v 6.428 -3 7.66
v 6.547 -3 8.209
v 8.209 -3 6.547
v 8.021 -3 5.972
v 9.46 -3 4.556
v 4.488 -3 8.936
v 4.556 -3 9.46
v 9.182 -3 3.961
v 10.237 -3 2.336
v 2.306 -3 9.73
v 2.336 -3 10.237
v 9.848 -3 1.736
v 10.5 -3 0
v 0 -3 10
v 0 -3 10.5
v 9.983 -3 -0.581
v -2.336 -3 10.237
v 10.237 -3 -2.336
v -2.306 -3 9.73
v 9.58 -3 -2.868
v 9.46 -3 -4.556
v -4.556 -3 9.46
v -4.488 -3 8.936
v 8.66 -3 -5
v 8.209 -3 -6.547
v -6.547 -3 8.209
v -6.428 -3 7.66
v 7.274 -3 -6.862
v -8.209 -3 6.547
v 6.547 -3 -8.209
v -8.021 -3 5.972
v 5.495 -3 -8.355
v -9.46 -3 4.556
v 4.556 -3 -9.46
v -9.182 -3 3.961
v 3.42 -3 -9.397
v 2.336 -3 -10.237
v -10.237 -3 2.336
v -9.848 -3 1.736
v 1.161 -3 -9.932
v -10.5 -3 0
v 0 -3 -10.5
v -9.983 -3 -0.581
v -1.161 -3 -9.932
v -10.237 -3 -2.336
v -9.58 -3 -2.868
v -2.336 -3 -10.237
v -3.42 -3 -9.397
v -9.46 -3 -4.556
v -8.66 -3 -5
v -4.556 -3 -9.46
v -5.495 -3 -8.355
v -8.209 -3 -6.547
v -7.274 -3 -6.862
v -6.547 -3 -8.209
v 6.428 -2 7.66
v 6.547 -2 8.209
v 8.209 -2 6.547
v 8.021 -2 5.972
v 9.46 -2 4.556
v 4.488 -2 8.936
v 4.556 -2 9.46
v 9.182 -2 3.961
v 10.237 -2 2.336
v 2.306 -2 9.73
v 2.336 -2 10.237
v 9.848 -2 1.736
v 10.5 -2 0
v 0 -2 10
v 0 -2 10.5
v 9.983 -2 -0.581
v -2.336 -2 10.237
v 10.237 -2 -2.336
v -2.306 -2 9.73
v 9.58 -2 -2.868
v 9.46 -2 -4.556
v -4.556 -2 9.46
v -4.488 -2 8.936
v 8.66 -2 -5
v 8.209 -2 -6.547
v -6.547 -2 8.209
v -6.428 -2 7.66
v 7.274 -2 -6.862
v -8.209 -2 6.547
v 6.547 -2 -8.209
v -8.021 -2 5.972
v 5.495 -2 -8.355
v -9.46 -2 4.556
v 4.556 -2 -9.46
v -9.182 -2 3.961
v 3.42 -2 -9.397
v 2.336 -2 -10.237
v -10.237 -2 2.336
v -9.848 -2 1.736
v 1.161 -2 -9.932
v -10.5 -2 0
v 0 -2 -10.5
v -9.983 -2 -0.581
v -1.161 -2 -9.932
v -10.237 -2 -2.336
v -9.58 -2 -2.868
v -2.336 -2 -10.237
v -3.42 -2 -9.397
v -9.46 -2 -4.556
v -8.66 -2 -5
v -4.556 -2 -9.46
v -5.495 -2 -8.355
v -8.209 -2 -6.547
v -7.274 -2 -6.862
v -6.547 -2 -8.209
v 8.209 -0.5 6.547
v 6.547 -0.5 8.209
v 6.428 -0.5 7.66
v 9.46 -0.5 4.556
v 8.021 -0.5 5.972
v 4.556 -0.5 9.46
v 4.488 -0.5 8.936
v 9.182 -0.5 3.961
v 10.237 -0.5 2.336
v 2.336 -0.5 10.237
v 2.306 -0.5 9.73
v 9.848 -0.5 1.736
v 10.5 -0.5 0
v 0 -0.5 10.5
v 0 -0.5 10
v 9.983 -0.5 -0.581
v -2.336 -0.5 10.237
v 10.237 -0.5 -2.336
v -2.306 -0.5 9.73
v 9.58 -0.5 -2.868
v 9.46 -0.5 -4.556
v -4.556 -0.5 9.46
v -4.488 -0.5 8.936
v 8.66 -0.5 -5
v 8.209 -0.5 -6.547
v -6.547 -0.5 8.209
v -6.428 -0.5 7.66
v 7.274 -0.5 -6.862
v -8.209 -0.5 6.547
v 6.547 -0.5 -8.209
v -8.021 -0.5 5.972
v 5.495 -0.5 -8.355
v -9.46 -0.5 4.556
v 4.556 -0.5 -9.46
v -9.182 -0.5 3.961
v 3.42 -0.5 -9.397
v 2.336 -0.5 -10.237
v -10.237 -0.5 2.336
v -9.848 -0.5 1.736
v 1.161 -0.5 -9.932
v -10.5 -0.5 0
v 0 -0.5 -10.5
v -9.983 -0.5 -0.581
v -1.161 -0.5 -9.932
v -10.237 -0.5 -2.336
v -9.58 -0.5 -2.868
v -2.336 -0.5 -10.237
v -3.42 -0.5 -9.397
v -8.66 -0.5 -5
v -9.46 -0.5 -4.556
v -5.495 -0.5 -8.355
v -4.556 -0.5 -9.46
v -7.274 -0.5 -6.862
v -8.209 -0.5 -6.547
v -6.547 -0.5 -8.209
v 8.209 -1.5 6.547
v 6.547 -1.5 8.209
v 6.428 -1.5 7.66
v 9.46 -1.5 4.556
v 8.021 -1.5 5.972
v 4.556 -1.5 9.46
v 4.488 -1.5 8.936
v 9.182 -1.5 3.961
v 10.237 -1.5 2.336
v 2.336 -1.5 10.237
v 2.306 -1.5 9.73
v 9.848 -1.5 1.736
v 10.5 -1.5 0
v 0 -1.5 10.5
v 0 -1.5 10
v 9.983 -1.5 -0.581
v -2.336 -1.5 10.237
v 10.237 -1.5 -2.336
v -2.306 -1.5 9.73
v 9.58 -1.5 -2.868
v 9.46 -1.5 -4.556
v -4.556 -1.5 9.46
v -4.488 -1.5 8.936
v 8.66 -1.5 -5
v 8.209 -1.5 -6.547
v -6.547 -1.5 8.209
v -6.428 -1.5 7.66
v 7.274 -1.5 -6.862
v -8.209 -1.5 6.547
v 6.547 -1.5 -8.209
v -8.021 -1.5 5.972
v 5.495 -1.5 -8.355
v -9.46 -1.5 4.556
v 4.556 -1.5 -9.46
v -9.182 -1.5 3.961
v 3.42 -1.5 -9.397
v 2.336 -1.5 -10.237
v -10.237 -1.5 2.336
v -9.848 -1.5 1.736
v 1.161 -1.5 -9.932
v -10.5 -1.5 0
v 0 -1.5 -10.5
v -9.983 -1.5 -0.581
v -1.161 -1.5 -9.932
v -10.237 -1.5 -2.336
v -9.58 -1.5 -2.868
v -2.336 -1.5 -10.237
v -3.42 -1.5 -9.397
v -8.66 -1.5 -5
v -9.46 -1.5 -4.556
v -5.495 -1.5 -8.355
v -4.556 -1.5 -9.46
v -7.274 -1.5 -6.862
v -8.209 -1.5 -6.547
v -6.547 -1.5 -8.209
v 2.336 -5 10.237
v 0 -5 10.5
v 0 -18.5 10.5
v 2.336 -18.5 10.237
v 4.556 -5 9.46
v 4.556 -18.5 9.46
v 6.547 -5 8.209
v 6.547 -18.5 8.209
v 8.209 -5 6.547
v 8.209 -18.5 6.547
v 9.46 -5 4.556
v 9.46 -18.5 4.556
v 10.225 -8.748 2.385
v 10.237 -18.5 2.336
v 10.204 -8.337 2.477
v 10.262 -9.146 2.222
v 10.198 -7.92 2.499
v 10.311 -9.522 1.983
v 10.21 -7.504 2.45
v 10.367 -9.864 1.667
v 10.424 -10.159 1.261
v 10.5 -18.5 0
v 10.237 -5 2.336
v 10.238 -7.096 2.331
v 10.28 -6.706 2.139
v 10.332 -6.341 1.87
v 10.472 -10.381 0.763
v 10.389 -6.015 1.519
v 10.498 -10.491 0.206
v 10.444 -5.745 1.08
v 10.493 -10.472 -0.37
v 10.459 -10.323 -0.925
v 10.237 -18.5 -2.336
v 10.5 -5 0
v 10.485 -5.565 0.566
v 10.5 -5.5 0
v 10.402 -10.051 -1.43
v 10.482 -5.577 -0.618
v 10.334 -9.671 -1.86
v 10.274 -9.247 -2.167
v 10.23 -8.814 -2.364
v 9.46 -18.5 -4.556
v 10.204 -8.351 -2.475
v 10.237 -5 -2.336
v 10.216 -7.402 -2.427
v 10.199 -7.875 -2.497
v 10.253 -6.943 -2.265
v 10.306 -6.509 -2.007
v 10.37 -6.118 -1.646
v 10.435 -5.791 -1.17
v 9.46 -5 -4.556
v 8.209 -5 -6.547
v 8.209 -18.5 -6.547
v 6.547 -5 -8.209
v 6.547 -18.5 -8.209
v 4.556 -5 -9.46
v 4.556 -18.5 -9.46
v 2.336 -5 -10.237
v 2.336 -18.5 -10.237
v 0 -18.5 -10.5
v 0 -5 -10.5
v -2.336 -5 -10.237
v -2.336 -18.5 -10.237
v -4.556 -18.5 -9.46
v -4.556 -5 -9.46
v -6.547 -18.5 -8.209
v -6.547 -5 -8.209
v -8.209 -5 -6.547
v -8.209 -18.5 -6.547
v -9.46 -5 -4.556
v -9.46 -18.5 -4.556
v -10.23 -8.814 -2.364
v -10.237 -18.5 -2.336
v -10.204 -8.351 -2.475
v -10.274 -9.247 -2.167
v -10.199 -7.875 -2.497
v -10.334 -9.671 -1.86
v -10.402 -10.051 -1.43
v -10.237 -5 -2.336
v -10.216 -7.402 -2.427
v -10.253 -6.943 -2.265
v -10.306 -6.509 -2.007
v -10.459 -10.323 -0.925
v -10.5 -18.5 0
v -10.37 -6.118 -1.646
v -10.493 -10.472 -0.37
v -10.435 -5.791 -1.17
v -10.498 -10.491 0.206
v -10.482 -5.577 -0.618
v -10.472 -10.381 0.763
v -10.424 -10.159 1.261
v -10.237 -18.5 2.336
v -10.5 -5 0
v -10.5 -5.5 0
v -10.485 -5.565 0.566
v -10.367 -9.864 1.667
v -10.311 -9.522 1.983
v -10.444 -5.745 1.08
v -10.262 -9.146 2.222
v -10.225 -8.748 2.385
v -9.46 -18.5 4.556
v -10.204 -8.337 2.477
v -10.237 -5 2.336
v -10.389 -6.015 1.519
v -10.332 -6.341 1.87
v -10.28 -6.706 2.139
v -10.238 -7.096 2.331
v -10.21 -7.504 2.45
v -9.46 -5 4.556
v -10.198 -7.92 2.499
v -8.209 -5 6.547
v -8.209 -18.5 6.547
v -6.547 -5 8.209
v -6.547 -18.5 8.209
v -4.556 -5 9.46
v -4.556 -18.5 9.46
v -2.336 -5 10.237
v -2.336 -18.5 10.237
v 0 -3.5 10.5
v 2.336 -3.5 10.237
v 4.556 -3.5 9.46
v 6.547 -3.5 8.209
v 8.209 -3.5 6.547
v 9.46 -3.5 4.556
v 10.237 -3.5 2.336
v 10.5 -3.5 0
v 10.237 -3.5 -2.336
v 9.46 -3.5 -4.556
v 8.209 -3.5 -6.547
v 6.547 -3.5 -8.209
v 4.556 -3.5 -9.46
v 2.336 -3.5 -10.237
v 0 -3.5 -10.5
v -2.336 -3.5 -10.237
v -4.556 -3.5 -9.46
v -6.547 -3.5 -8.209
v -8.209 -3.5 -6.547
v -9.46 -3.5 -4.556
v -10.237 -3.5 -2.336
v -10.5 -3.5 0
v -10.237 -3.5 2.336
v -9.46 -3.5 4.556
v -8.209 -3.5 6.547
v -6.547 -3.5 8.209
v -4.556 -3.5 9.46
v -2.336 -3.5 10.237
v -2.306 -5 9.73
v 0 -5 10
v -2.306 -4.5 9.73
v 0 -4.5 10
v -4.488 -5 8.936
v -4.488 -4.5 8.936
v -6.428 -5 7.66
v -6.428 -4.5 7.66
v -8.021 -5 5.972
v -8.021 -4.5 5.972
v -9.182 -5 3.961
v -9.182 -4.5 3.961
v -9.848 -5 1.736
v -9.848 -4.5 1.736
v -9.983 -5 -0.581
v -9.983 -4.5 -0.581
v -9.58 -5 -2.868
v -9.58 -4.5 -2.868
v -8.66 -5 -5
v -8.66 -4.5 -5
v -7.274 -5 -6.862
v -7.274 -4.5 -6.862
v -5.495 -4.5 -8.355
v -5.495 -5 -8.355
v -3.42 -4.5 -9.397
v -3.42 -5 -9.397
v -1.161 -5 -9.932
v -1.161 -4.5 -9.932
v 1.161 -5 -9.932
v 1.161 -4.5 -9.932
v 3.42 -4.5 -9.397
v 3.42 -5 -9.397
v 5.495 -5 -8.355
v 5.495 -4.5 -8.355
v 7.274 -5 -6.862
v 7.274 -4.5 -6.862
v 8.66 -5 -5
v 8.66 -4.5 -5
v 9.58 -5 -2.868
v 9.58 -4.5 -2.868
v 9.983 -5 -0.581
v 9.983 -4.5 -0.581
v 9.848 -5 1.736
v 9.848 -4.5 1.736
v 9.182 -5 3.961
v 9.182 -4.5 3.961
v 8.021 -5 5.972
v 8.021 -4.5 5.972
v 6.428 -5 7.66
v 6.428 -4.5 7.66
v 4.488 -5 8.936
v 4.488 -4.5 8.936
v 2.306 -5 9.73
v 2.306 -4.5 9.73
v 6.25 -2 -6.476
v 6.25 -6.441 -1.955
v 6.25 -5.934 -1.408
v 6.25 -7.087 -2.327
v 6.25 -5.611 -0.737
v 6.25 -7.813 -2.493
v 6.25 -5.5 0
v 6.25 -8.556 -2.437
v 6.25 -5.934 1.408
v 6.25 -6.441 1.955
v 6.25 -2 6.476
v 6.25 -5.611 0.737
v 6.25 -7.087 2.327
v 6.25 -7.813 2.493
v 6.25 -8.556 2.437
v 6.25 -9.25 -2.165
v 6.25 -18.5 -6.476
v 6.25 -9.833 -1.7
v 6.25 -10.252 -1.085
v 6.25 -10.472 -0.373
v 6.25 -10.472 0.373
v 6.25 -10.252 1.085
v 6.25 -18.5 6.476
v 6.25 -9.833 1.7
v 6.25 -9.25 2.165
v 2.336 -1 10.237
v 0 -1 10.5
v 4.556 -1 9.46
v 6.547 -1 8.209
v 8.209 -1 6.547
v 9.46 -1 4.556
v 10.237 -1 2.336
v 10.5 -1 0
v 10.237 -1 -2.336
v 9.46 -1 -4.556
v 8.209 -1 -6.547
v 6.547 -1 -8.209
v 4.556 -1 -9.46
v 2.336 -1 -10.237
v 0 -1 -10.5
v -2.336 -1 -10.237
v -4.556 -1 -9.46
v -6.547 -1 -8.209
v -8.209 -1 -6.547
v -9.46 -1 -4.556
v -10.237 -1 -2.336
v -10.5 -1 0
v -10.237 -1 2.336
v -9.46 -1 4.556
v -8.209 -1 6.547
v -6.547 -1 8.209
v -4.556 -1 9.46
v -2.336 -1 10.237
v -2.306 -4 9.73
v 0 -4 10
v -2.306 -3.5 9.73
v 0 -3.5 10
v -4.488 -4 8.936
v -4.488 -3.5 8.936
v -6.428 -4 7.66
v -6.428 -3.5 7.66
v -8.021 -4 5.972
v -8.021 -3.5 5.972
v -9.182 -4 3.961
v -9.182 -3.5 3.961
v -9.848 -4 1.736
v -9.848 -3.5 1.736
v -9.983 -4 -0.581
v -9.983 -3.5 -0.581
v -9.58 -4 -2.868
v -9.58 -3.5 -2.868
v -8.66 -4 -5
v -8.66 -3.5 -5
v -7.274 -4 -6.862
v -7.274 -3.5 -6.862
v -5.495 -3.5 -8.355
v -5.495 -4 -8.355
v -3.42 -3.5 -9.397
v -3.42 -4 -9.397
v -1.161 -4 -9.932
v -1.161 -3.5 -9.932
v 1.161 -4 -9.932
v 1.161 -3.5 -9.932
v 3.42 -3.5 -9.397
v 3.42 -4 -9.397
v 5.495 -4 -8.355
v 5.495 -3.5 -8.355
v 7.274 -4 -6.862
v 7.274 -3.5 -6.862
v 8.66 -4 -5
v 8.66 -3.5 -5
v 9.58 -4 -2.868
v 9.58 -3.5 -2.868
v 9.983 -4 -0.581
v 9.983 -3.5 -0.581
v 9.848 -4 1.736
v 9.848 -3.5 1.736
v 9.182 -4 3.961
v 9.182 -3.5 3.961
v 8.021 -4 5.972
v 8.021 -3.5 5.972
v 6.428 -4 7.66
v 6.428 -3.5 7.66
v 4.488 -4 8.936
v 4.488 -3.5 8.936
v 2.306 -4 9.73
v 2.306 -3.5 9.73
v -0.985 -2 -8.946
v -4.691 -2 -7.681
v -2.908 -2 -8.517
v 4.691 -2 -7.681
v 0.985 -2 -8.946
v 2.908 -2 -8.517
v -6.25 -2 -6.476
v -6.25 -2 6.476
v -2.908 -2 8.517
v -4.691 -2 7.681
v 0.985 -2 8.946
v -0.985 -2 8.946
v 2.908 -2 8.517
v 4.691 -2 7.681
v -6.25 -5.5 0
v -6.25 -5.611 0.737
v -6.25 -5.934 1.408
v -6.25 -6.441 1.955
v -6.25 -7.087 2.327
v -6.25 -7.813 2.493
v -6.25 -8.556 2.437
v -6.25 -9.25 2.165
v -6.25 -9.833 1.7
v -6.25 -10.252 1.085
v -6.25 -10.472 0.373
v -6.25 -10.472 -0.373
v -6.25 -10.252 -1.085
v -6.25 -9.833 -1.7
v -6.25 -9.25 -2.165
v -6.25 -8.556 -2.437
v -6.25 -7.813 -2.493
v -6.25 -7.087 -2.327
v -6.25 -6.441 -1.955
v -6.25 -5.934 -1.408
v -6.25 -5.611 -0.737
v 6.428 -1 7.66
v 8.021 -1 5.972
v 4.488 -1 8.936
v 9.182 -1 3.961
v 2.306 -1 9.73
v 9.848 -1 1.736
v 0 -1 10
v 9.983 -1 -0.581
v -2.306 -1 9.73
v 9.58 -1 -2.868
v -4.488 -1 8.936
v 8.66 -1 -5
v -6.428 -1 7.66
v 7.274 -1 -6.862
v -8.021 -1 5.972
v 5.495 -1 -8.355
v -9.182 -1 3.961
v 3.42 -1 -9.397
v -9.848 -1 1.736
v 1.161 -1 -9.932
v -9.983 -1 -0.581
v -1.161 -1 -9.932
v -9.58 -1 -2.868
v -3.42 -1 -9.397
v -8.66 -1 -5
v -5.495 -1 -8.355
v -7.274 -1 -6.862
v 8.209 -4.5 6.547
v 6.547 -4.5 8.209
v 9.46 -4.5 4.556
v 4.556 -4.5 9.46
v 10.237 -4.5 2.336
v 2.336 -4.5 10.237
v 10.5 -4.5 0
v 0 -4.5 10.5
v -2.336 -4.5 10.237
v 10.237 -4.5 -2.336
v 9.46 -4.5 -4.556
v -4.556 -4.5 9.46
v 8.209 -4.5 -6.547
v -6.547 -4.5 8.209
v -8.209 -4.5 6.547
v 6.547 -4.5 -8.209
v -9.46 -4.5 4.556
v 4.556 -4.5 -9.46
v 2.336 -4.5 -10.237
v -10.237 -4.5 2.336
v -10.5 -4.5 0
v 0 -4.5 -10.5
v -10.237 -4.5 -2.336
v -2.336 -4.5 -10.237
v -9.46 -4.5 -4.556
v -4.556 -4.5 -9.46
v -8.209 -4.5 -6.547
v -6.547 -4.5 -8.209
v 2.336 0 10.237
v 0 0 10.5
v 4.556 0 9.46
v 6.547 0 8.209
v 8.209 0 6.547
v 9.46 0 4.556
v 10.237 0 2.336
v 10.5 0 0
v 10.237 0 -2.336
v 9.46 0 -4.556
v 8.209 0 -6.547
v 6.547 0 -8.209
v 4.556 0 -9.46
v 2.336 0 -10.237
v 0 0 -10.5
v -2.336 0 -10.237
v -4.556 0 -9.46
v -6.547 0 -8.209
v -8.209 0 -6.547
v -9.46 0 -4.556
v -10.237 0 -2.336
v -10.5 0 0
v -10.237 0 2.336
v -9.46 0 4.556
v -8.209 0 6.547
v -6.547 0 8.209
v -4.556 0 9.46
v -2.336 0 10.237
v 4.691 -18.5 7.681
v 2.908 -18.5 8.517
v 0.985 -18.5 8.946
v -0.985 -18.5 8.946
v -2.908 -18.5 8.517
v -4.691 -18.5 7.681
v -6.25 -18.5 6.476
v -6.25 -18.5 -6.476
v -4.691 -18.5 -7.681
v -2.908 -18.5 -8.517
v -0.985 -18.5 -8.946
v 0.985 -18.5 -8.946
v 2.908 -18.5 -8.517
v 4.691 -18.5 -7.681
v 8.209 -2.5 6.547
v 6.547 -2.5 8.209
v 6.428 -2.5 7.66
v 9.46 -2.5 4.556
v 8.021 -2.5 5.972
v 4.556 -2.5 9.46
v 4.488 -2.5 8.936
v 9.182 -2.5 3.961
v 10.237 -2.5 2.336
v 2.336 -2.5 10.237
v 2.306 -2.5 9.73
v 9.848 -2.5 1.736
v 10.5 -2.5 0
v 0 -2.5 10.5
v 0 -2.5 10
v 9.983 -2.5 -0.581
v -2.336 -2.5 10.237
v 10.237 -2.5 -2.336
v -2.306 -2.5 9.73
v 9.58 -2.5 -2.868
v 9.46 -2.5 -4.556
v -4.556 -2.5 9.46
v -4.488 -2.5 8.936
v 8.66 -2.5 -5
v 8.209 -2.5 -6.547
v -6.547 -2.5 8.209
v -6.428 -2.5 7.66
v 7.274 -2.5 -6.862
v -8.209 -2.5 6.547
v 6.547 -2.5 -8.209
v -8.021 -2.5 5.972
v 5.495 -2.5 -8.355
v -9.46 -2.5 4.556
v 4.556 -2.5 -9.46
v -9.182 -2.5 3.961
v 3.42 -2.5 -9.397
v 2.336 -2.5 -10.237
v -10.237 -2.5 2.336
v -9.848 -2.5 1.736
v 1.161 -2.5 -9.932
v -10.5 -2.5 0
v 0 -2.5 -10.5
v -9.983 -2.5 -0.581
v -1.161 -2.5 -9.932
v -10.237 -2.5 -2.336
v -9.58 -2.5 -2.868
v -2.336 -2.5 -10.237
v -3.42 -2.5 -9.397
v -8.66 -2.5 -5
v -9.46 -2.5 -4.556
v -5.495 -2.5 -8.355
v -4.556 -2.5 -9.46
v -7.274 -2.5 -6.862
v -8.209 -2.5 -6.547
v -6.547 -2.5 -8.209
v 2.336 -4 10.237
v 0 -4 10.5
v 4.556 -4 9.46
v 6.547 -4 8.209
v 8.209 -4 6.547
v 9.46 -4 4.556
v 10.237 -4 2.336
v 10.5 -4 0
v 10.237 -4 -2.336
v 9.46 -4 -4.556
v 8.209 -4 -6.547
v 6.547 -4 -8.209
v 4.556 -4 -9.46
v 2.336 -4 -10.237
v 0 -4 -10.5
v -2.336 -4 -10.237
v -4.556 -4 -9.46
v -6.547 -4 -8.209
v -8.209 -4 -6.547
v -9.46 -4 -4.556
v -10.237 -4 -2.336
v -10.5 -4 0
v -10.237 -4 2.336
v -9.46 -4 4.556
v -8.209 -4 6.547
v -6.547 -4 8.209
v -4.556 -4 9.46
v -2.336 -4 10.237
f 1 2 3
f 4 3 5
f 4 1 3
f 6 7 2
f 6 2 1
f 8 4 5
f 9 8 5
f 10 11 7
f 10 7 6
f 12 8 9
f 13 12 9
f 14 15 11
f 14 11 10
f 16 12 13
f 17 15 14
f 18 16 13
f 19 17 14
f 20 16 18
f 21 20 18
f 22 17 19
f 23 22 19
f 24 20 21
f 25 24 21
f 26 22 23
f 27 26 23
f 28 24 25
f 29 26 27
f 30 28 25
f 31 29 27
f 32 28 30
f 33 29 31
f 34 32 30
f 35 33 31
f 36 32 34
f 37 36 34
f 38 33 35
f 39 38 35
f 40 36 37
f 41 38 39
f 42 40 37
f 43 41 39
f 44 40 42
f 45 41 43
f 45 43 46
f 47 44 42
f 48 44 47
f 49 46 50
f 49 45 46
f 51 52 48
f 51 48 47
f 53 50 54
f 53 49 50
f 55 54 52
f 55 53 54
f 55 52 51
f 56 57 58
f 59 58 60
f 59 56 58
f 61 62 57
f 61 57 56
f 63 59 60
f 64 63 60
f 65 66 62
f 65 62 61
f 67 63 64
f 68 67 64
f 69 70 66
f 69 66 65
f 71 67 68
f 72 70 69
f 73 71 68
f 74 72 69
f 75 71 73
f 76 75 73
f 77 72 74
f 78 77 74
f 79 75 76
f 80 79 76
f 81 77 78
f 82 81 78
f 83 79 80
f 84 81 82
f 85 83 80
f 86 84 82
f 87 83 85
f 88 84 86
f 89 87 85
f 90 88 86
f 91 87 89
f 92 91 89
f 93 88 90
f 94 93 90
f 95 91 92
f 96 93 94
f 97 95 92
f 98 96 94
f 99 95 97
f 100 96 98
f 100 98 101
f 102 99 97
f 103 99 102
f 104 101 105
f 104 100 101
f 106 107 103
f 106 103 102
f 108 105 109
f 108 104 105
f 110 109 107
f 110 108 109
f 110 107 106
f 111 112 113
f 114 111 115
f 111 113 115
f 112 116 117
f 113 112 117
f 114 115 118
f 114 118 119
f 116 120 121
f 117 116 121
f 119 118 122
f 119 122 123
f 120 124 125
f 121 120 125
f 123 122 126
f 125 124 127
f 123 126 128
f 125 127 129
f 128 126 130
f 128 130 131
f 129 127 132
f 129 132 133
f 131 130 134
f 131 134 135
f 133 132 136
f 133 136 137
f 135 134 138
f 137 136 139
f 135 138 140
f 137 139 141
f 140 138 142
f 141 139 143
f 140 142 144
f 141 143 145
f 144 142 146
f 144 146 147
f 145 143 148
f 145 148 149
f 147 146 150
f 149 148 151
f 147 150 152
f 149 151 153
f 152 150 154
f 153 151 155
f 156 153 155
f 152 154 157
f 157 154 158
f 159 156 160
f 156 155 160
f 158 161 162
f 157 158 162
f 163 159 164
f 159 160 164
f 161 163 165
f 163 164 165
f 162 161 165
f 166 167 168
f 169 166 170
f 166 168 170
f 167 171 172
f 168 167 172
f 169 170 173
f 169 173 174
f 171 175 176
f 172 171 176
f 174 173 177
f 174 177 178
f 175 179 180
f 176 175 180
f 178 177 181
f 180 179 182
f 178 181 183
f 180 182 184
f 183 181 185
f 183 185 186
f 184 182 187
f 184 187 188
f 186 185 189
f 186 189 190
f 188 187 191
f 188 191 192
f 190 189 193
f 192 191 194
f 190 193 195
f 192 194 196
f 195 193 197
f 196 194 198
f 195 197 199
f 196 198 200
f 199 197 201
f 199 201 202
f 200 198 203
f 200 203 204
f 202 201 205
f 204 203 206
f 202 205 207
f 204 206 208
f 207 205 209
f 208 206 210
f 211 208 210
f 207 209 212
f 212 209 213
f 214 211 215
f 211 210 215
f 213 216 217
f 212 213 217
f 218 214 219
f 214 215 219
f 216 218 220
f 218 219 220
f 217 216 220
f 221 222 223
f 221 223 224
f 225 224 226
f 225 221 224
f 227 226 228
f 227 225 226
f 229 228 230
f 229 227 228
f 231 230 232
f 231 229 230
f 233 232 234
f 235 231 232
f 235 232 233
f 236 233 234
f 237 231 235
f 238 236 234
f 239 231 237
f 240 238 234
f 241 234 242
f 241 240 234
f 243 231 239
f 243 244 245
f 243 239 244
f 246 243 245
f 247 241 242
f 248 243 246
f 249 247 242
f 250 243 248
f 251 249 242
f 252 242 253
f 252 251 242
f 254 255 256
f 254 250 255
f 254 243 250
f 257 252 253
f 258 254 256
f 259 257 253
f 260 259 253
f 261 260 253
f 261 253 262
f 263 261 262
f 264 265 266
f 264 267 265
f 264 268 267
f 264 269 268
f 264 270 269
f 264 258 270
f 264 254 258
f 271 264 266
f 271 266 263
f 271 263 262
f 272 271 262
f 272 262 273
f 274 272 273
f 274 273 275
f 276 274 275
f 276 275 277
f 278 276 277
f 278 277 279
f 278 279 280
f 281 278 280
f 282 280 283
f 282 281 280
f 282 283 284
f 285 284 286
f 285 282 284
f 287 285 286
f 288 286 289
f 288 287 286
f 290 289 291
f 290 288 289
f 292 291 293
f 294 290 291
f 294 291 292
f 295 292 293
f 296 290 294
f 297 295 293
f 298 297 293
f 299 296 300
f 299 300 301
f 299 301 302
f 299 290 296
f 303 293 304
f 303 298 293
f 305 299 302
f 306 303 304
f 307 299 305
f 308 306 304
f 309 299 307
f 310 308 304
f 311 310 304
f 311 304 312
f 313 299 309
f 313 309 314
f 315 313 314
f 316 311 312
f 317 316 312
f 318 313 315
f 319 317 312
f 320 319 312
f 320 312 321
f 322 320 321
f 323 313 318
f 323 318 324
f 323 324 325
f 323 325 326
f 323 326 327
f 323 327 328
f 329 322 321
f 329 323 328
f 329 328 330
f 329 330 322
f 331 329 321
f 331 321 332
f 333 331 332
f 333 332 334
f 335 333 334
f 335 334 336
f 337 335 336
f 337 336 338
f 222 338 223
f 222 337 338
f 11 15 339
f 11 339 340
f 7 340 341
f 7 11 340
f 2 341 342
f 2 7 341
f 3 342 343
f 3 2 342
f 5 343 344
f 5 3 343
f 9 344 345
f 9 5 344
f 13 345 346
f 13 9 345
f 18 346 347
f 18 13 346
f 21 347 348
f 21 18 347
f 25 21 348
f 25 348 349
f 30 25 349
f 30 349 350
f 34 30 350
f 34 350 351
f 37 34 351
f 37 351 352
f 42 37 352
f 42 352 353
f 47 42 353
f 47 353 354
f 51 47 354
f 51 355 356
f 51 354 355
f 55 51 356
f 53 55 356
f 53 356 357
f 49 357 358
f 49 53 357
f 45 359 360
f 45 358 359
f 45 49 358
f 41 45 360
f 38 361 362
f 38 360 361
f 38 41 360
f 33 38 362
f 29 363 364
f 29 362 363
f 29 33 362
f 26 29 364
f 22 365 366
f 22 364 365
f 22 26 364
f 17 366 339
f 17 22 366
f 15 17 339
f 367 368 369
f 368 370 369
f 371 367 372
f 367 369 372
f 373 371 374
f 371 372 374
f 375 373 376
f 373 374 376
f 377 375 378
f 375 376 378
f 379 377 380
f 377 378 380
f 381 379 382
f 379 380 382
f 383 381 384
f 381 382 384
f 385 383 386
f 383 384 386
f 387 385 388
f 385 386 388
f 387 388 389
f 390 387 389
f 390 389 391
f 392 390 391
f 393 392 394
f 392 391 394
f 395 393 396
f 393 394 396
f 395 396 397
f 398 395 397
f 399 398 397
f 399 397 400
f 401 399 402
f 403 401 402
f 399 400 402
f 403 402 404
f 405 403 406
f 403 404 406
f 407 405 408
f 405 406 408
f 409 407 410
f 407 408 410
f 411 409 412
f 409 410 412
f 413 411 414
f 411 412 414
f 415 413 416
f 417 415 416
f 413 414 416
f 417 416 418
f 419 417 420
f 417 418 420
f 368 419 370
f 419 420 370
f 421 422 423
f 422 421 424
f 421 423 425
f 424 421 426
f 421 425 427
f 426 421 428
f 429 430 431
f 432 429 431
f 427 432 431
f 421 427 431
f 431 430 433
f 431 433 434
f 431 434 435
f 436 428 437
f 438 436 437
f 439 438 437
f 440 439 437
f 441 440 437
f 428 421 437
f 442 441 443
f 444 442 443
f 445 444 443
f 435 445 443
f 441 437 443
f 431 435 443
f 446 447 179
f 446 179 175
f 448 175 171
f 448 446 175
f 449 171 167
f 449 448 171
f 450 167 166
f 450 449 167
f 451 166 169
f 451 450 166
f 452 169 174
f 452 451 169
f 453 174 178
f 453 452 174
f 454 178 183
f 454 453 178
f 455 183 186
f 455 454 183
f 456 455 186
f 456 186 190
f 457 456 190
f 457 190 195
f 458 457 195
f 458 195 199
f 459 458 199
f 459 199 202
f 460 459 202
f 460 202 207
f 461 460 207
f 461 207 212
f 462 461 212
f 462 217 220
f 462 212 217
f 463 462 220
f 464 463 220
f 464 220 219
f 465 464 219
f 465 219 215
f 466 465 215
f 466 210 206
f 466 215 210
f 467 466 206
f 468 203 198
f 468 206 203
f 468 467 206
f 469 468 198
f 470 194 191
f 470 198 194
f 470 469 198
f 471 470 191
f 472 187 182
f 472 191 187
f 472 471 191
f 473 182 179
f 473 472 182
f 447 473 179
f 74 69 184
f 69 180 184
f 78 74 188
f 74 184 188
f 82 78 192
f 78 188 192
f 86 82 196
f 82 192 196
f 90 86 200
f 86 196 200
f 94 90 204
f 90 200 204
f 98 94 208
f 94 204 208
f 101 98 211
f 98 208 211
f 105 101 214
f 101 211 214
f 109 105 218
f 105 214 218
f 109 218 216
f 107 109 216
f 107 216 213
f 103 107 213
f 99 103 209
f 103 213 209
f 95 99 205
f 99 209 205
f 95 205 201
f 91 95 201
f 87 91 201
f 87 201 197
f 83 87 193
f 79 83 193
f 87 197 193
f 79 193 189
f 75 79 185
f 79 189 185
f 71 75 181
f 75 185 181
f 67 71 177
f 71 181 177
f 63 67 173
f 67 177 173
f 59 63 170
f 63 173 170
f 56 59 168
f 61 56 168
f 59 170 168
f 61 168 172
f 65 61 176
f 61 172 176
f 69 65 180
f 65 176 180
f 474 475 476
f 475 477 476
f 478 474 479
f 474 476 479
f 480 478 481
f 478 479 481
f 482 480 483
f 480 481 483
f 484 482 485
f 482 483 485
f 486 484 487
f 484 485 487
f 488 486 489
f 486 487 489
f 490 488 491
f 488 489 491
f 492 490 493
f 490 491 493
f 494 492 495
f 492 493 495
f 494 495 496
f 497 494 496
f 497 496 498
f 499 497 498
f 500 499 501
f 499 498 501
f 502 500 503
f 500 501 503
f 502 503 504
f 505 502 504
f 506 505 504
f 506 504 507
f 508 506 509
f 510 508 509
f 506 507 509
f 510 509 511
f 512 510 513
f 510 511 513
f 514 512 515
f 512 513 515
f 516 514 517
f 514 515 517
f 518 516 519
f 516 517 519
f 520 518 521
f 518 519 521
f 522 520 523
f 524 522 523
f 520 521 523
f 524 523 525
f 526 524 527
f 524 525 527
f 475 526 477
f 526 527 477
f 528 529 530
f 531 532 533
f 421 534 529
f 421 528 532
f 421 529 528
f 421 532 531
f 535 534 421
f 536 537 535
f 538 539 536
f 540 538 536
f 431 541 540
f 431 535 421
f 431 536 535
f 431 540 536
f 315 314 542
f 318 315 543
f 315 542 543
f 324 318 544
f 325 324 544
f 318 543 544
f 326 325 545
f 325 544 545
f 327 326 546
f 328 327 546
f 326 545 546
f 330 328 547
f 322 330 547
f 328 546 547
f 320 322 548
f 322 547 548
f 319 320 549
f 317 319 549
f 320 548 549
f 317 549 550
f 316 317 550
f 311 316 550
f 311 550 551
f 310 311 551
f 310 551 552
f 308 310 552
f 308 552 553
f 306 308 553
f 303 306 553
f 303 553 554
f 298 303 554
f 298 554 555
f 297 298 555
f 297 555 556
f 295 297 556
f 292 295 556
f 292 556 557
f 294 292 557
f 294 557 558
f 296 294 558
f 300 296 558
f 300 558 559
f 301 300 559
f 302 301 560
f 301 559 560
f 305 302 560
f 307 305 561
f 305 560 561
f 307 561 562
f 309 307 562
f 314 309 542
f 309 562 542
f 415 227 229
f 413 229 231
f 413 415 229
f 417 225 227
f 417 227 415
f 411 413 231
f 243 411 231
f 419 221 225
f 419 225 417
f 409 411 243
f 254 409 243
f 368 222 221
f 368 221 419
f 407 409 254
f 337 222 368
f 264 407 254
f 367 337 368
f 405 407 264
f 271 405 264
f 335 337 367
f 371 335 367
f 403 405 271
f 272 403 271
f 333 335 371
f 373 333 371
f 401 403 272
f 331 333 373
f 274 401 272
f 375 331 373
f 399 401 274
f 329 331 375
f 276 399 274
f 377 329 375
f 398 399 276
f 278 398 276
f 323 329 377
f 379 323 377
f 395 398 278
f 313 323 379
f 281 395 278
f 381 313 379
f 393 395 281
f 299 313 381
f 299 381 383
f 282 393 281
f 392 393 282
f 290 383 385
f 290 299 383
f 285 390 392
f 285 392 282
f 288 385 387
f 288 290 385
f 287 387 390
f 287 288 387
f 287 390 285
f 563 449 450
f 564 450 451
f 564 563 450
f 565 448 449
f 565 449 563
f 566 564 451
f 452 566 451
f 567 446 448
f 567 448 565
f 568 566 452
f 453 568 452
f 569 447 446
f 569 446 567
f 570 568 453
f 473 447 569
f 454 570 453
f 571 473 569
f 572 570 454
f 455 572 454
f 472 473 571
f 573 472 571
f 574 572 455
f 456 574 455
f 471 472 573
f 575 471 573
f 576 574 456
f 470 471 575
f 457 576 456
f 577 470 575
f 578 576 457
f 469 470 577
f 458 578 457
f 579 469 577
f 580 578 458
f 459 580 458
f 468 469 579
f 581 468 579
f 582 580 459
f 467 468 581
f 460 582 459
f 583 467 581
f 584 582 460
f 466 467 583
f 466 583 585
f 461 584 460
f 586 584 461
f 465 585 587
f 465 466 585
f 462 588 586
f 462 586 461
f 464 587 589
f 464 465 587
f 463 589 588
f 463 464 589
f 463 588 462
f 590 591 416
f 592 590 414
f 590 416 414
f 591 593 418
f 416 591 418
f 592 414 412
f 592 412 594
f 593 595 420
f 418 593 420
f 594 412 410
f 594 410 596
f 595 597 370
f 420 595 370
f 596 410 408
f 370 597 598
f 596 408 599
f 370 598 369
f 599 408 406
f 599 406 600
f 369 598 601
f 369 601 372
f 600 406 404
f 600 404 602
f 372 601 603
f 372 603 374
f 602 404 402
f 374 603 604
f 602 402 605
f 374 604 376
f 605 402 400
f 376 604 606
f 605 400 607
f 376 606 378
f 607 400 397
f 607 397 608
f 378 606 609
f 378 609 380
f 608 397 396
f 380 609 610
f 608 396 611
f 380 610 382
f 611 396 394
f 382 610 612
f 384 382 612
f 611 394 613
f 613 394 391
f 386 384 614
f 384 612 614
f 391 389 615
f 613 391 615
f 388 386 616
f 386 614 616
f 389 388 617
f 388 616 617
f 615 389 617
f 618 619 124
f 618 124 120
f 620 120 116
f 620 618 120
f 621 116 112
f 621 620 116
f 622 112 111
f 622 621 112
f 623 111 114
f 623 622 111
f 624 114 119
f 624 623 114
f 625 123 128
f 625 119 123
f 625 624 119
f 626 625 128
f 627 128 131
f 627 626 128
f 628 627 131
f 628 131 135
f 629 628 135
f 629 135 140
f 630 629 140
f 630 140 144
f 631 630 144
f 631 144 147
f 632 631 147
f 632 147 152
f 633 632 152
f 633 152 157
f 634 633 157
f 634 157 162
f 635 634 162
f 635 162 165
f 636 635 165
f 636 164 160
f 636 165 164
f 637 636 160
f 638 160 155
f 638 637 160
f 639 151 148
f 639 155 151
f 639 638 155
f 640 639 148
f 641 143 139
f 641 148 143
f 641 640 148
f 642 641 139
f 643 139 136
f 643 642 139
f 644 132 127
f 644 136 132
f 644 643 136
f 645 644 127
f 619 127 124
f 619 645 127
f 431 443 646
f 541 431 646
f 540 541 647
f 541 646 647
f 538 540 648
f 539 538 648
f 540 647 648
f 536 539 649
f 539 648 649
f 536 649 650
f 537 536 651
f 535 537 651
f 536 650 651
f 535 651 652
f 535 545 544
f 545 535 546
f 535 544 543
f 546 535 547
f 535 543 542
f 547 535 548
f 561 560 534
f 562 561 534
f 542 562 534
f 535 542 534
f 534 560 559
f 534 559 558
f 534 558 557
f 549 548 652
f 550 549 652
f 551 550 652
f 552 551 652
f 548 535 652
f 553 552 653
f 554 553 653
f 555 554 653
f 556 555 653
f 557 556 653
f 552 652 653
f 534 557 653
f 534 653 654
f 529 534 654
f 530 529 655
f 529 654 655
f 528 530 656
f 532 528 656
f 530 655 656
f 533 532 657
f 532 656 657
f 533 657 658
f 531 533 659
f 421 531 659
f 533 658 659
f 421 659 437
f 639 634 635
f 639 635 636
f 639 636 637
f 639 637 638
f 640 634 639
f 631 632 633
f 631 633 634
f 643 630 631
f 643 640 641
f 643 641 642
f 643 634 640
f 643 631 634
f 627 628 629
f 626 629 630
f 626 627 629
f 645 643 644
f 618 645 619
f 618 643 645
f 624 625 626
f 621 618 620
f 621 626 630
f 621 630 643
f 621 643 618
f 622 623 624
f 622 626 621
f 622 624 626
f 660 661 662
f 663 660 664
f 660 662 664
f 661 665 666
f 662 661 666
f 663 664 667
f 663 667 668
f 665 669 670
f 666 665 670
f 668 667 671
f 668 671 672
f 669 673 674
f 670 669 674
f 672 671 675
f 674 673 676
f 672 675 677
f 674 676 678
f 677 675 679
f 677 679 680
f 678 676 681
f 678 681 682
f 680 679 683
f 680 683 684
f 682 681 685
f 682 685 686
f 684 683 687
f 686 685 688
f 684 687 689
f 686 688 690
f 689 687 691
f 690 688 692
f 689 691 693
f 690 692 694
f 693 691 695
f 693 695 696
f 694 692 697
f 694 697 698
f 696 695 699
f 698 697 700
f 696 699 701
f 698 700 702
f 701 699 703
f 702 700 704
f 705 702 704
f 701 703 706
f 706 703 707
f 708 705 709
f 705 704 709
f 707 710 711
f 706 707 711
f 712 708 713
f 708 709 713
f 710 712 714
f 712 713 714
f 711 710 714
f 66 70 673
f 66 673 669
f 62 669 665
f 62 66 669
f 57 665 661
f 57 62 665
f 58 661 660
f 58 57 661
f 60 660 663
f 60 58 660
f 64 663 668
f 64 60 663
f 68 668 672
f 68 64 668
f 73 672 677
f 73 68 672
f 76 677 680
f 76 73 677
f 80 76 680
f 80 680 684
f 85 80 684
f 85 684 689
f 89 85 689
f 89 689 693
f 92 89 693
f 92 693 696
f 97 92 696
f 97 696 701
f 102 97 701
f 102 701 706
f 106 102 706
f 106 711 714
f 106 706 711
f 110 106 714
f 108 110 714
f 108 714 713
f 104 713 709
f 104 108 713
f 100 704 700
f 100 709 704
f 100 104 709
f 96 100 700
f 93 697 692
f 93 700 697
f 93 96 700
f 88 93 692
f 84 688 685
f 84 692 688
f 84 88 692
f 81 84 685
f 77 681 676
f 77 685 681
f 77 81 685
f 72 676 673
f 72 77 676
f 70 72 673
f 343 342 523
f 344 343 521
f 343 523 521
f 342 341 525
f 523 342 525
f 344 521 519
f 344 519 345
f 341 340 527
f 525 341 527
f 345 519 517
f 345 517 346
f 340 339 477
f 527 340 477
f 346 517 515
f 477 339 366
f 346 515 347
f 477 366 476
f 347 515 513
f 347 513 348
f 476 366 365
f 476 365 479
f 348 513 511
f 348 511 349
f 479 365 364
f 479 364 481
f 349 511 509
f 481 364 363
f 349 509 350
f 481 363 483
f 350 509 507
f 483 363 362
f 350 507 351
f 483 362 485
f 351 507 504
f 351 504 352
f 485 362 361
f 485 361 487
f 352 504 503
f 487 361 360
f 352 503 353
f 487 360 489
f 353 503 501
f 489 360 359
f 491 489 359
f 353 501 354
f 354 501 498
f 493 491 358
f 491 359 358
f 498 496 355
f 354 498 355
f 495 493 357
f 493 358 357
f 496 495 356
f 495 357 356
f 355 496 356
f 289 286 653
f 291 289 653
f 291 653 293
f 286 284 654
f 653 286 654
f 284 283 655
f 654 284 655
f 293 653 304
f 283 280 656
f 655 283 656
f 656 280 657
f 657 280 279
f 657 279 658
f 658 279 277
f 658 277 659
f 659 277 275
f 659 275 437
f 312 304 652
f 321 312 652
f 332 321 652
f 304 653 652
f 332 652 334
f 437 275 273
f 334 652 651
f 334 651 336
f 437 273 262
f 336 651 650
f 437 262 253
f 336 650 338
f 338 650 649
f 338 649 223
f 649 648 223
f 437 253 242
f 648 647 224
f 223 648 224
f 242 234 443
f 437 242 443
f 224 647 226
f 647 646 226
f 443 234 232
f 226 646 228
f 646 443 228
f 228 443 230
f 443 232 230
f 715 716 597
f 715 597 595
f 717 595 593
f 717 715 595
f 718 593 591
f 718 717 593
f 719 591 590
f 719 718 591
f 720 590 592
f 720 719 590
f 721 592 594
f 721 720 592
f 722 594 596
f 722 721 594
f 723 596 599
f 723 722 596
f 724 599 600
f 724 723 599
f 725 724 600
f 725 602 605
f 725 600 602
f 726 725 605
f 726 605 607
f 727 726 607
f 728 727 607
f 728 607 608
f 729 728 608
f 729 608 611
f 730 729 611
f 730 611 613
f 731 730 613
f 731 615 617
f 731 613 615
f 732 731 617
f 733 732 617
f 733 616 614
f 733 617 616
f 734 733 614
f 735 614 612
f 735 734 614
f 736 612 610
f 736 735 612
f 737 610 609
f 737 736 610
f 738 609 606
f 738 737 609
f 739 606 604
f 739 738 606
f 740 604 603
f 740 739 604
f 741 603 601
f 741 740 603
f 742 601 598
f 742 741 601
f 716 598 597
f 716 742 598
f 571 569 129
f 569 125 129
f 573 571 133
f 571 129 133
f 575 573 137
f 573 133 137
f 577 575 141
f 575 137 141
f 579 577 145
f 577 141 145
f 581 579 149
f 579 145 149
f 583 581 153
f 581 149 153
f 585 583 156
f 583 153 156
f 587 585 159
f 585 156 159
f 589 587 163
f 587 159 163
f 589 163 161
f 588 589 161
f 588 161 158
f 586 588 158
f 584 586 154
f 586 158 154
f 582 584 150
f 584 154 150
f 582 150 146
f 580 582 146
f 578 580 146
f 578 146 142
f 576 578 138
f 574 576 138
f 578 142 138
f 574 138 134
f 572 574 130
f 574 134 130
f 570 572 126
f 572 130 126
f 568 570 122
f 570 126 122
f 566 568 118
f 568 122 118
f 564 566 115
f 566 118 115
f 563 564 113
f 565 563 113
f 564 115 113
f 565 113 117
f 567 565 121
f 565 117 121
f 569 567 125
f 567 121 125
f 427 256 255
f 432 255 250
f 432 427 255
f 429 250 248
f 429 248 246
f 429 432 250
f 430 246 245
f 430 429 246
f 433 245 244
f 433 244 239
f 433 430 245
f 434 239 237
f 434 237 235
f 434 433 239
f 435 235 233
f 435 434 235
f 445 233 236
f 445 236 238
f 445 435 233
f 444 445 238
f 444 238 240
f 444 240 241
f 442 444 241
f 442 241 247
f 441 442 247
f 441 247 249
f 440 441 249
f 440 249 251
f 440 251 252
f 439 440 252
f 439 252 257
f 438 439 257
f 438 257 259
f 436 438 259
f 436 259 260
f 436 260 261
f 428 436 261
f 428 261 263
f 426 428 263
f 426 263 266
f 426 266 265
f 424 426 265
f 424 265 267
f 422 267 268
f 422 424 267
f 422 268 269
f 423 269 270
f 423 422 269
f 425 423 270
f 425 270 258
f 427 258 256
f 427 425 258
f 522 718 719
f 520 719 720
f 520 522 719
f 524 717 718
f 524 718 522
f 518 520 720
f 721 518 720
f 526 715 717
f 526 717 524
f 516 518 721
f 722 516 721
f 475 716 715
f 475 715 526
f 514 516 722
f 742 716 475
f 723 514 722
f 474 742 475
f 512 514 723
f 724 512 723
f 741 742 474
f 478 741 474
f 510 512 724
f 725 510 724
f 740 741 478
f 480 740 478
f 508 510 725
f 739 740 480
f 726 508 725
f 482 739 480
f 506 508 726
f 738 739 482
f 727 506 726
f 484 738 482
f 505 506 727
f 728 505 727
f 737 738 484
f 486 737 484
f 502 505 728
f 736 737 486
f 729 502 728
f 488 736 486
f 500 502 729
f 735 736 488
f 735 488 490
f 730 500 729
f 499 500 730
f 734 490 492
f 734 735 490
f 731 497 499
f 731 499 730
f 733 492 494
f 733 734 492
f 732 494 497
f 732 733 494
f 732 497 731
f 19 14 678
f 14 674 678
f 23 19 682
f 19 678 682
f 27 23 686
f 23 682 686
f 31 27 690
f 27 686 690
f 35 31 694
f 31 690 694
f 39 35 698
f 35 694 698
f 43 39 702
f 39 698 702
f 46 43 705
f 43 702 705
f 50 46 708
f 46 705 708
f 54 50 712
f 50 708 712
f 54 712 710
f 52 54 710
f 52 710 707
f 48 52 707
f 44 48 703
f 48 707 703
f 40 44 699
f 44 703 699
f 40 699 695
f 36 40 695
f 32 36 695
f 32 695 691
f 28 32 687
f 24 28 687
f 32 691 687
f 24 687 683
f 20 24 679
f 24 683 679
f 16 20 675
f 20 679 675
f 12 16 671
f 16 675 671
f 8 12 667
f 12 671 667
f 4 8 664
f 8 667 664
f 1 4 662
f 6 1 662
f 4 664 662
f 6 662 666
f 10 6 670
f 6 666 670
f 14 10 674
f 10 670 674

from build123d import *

# Parameters (mm, degrees)
SKETCH2_R               = 10.5
BOSS_EXTRUDE1_DEPTH     = 18.5
CUT_EXTRUDE1_DEPTH      = 16.5
SKETCH4_R               = 2.5
CUT_EXTRUDE2_DEPTH      = 11.5
CUT_EXTRUDE2_DEPTH_BACK = 11.5
SKETCH5_W               = 0.5
SKETCH5_H               = 0.5
LPATTERN1_COUNT         = 5
LPATTERN1_PITCH         = 1


with BuildPart() as part:
    # Sketch2 → Boss-Extrude1 (new body)
    with BuildSketch(Plane(origin=(0, 0, 0), x_dir=(1, 0, 0), z_dir=(0, 1, 0))):
        with Locations(Location((0, 0, 0), (0, 0, 270))):  # turned: the seam where the file's is
            Circle(SKETCH2_R)
    extrude(amount=-BOSS_EXTRUDE1_DEPTH)

    # Sketch3 → Cut-Extrude1 (cut)
    with BuildSketch(Plane.XZ.offset(18.5)):
        with BuildLine():
            Line((-6.25, 6.475916923), (-6.25, -6.475916923))
            ThreePointArc((-6.25, -6.475916923), (0, -9), (6.25, -6.475916923))
            Line((6.25, -6.475916923), (6.25, 6.475916923))
            ThreePointArc((6.25, 6.475916923), (0, 9), (-6.25, 6.475916923))
        make_face()
    extrude(amount=-CUT_EXTRUDE1_DEPTH, mode=Mode.SUBTRACT)

    # Sketch4 → Cut-Extrude2 (cut, two sides)
    with BuildSketch(Plane(origin=(0, 0, 0), x_dir=(0, 0, -1), z_dir=(1, 0, 0))) as cut_extrude2_sk:
        with Locations(Location((0, -8, 0), (0, 0, 90))):  # turned: the seam where the file's is
            Circle(SKETCH4_R)
    extrude(amount=CUT_EXTRUDE2_DEPTH, mode=Mode.SUBTRACT)
    extrude(cut_extrude2_sk.sketch, amount=-CUT_EXTRUDE2_DEPTH_BACK, mode=Mode.SUBTRACT)

    # Sketch5 → Cut-Revolve1 (revolve, cut)
    with BuildSketch(Plane(origin=(0, 0, 0), x_dir=(0, 0, -1), z_dir=(1, 0, 0)), mode=Mode.PRIVATE) as cut_revolve1_sk:
        with Locations((10.25, -0.75)):
            Rectangle(SKETCH5_W, SKETCH5_H)
    cut_revolve1 = revolve(cut_revolve1_sk.sketch.rotate(Axis((0, 0, 0), (0, -1, 0)), 180), axis=Axis((0, 0, 0), (0, -1, 0)), mode=Mode.SUBTRACT)  # turned: the seam where the file's is

    # LPattern1: Cut-Revolve1 ×5
    with Locations(*[(0, -i * LPATTERN1_PITCH, 0) for i in range(1, LPATTERN1_COUNT)]):
        add(cut_revolve1, mode=Mode.SUBTRACT)


solid = part.part
